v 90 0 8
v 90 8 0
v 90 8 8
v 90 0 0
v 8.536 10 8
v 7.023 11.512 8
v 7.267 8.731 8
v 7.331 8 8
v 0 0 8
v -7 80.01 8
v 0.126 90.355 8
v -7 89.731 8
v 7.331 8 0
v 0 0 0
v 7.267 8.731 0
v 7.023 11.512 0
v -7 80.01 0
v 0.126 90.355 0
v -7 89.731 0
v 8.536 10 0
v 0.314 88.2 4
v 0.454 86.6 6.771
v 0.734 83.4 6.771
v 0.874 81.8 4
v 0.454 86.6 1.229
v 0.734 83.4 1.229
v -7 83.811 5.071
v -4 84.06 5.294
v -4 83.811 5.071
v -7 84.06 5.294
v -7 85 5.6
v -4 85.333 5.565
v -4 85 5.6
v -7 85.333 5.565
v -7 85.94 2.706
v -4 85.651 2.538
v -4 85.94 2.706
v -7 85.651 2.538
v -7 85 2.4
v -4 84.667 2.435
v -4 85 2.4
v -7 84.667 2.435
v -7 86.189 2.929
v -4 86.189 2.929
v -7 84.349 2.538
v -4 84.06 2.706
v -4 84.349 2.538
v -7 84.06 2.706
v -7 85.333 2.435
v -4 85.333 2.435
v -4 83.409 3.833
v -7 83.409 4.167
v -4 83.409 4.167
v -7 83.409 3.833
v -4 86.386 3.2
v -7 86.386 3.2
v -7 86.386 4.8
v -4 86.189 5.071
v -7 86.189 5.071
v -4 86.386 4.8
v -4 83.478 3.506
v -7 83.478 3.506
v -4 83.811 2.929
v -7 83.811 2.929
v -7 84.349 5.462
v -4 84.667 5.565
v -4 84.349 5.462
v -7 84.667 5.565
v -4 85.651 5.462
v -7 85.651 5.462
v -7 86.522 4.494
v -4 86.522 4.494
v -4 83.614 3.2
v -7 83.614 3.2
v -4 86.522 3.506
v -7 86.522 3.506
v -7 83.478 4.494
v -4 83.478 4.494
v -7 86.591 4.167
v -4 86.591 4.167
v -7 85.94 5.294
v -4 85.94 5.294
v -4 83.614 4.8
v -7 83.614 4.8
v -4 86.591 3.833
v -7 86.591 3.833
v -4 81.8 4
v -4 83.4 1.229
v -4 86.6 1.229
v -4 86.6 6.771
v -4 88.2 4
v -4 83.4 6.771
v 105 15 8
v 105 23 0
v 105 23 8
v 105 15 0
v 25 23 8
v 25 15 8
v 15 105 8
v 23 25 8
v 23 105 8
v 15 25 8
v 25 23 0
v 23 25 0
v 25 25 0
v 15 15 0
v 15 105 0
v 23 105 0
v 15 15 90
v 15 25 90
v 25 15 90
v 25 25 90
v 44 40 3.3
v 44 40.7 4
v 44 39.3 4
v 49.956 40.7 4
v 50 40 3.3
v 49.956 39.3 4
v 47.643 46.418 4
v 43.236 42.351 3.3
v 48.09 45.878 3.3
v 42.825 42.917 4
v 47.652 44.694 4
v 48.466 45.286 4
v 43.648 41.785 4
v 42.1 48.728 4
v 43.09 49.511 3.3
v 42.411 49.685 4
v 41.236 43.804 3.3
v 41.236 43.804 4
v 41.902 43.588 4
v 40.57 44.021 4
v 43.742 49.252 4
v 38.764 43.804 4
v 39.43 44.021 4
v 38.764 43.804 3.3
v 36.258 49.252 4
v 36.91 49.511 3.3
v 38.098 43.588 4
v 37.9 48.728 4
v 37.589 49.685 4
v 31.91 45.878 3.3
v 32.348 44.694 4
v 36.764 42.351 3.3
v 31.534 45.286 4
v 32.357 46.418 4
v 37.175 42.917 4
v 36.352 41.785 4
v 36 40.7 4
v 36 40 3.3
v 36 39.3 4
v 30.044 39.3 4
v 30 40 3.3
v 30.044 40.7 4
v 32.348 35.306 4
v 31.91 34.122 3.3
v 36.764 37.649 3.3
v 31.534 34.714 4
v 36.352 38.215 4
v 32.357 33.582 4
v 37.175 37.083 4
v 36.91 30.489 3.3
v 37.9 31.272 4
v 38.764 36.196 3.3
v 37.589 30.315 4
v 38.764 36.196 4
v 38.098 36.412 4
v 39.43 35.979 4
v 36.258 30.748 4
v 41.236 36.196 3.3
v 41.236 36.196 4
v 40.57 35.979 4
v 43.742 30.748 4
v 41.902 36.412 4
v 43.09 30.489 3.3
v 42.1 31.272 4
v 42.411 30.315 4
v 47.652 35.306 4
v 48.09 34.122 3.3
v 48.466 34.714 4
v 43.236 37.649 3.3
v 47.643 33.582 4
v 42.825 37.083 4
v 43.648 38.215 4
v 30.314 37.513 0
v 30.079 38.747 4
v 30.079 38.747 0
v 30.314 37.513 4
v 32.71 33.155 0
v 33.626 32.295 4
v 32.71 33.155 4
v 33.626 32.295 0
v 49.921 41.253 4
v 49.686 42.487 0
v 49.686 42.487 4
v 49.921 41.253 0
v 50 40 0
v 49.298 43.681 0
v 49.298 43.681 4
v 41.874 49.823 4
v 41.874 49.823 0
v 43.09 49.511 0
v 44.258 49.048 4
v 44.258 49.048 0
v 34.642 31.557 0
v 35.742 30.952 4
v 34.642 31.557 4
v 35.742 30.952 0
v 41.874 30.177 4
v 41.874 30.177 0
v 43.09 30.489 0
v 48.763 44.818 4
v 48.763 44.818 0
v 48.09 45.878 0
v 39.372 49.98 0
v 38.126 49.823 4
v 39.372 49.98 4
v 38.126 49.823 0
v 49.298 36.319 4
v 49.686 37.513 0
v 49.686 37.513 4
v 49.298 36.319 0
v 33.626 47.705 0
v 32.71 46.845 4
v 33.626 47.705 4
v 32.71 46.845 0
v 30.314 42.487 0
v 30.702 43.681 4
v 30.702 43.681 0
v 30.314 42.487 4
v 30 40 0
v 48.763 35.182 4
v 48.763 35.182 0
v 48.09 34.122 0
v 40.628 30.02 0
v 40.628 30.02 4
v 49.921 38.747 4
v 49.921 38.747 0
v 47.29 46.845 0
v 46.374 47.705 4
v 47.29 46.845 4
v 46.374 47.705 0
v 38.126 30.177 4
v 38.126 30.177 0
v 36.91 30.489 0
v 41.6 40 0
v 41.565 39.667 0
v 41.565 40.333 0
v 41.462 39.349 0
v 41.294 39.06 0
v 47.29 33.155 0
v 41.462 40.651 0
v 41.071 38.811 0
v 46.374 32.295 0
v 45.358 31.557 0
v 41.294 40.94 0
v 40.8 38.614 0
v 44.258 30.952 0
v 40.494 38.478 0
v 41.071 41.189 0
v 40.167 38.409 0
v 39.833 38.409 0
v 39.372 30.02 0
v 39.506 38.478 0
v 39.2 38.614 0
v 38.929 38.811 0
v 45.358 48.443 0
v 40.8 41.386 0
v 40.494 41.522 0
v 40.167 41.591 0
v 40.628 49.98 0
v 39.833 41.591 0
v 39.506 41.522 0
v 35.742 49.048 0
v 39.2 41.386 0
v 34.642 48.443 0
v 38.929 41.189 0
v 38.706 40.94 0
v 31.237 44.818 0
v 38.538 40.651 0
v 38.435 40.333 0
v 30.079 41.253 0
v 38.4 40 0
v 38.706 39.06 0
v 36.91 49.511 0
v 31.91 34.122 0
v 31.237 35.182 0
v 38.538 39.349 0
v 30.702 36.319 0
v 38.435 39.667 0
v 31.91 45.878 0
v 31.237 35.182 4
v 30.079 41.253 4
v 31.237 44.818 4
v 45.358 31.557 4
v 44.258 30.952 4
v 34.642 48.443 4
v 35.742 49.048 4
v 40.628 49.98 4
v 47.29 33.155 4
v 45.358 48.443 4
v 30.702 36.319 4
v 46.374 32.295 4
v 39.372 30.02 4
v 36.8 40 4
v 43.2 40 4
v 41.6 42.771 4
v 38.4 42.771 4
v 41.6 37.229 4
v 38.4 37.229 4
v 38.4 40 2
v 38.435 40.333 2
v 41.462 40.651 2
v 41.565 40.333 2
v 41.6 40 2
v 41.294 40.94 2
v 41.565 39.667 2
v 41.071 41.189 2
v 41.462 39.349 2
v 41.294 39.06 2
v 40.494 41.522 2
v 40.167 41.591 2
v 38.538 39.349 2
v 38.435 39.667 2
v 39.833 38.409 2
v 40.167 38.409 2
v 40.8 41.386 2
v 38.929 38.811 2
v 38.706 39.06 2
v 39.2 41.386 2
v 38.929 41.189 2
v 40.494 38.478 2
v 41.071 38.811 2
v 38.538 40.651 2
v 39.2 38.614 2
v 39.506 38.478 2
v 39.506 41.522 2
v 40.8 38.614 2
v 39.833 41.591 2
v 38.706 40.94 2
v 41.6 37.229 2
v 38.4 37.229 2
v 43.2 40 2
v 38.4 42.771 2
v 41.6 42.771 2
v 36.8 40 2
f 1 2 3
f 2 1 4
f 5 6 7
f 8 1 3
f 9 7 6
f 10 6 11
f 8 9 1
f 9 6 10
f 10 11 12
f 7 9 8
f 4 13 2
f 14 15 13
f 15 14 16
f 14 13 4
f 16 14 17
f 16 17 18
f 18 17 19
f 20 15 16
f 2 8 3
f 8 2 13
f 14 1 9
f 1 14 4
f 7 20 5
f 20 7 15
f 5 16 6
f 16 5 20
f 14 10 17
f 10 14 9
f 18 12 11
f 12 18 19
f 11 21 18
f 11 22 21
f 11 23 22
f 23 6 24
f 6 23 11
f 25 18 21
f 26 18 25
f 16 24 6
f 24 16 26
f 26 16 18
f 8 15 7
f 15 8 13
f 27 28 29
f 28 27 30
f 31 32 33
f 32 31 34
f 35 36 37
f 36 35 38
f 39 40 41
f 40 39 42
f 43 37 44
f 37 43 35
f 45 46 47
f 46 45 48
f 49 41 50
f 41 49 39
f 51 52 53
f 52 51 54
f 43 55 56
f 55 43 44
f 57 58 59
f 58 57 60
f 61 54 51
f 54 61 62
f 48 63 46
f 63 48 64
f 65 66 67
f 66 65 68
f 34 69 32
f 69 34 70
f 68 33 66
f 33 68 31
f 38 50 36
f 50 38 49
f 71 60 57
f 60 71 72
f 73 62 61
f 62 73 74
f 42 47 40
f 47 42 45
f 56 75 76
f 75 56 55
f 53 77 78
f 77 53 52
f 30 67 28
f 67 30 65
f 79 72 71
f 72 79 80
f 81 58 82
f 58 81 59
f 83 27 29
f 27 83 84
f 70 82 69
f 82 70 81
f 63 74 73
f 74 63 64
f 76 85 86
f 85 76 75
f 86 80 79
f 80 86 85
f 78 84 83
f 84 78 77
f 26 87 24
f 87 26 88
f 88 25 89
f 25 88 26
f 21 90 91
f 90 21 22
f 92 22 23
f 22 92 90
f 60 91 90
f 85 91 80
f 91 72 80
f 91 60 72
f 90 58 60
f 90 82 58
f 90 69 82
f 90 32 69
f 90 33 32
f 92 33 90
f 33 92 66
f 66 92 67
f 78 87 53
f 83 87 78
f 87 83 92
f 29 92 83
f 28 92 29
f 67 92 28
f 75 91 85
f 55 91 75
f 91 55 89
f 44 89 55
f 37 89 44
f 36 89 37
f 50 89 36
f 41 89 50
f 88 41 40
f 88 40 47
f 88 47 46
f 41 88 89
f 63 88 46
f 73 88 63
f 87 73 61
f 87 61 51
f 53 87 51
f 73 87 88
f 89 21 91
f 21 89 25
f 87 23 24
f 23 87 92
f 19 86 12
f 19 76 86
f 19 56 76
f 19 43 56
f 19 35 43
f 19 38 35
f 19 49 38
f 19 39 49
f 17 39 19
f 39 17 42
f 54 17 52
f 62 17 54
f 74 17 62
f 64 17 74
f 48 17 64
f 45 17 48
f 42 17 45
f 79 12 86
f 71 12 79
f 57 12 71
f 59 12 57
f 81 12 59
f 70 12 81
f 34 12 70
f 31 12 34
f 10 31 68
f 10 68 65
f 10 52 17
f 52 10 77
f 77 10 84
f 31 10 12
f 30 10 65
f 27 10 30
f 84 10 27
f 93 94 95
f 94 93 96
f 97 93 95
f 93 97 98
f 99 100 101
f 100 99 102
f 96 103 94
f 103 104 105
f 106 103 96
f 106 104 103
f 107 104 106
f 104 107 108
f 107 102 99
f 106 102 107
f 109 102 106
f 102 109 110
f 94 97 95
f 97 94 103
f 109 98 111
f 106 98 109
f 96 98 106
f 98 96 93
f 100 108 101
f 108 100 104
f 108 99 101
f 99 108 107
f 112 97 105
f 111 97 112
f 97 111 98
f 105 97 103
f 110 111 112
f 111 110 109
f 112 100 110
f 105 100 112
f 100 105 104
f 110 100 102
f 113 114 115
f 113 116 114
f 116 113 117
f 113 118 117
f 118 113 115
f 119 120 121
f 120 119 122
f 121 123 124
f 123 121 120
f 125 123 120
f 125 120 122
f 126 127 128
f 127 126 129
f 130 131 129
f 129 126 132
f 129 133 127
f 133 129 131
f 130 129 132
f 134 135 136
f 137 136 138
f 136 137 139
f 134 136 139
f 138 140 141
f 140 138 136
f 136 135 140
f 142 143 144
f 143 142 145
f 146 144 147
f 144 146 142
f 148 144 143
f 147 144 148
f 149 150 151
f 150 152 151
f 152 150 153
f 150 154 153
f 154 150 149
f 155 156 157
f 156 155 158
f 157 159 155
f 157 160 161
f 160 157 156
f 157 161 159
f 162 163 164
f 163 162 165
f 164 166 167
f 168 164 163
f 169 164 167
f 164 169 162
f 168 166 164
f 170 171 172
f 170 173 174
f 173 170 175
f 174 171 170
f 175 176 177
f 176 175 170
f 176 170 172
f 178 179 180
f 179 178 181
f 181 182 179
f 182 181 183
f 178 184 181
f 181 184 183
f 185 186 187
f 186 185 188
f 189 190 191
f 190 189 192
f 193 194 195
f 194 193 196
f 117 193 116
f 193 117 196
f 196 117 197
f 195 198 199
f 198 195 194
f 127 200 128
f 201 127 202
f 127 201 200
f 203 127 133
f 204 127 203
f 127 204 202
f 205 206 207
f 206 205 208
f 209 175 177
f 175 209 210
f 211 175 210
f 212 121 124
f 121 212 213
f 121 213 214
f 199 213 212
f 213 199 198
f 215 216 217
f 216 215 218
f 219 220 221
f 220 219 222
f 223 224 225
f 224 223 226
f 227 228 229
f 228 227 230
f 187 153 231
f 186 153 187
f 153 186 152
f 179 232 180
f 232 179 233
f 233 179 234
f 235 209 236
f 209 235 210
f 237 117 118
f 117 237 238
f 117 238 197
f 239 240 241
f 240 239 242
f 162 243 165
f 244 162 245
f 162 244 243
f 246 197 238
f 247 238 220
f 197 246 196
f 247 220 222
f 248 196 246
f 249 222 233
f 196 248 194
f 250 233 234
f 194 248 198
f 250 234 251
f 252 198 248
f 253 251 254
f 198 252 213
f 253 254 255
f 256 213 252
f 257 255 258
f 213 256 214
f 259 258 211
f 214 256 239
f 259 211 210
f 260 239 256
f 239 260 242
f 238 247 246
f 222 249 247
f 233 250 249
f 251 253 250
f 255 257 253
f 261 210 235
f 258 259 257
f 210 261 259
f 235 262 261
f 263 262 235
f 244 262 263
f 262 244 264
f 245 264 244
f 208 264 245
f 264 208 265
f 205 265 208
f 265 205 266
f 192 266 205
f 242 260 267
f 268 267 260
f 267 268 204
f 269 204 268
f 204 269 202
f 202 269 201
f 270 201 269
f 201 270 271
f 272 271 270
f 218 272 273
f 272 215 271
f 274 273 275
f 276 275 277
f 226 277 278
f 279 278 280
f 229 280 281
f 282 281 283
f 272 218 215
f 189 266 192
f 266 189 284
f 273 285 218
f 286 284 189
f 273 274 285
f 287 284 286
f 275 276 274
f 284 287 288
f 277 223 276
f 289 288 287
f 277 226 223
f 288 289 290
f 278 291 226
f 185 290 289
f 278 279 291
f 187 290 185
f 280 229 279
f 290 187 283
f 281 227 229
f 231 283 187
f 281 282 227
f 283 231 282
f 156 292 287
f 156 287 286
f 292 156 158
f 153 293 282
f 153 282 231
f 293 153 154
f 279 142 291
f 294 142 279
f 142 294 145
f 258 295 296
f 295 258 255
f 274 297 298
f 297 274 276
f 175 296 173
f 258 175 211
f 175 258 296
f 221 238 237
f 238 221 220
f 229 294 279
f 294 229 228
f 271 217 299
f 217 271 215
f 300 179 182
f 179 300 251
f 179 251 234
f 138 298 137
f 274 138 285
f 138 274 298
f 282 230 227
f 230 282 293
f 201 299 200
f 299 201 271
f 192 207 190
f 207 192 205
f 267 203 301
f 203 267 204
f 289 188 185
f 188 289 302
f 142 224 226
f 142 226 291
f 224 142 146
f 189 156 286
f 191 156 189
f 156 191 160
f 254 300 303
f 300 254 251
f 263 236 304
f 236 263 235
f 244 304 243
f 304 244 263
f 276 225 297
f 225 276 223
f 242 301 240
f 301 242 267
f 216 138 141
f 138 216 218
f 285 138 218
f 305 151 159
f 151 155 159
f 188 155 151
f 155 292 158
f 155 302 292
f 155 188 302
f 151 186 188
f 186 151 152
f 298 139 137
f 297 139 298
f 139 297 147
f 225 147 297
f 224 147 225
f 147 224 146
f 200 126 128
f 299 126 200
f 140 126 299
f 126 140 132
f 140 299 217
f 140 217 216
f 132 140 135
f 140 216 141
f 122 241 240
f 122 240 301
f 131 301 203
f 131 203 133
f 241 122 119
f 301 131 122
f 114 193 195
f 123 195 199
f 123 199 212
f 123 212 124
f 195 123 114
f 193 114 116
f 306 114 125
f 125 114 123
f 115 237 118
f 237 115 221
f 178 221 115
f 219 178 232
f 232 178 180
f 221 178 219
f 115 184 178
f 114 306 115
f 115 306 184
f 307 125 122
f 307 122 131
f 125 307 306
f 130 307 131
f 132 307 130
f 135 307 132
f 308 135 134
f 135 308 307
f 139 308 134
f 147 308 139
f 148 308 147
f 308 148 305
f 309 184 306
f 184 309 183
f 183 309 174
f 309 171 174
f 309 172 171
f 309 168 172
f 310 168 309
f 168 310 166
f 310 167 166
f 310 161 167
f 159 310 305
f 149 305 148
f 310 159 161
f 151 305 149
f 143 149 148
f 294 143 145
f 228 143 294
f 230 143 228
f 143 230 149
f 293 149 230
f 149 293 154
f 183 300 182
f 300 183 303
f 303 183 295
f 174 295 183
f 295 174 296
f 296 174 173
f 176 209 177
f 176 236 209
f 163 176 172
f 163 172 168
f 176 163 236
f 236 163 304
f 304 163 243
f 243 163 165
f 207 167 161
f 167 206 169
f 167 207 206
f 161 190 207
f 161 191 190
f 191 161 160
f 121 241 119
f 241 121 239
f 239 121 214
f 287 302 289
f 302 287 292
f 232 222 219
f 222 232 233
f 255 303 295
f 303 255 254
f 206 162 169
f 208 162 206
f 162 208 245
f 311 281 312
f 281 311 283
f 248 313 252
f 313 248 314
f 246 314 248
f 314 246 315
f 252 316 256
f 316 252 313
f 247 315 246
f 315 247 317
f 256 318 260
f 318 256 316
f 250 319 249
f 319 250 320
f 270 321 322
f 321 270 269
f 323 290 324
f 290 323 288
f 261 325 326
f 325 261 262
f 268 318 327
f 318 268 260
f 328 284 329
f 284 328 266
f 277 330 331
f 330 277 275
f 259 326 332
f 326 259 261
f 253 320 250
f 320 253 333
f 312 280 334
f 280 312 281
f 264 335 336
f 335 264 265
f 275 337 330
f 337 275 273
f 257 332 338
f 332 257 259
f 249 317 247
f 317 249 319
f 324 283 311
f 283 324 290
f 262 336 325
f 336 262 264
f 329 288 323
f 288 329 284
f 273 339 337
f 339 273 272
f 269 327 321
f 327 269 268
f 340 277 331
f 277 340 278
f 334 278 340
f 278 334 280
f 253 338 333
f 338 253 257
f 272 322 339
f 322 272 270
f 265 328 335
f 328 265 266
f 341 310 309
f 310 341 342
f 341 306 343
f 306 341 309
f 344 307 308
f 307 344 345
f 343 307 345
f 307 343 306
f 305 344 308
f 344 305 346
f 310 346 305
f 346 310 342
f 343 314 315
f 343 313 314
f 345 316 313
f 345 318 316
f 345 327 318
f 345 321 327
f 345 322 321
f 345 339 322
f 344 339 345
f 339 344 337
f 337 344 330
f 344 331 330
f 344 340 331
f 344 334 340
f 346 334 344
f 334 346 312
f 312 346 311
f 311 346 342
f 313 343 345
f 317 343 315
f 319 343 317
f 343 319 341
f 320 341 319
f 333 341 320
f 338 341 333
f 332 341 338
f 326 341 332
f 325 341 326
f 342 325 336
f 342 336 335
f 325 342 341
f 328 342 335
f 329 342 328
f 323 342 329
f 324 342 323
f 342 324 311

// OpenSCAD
// OpenSCAD file for producing the testpiece, gauge and thumbwheel for orthogonal axis compensation for RepRapPro Ormerod, Mendel and Huxley printers //

long = 90; // Set length for testpiece here

// comment out the following lines to get the parts you want. Comment out the translations if you want the part at the origin.

Gauge();

translate ([15,15,0])
TestPiece();

translate ([40,40,0])
ThumbWheel();

module Gauge()
{
	difference()
	{
		 union()
		 {
			cube([long,8,8]);
			translate([5, 10, 4])
			rotate([0,0,45])
			cube([5,5,8], center=true);
			rotate([0,0,5])
			cube([8,long,8]);
		 }
		 translate([-5, long-5, 4])
		 {
			 rotate([0,90,0])
				cylinder(r=1.6,h=30,center=true,$fn=30);
			 translate([16,0,0])
			 rotate([0,90,0])
				rotate([0,0,30])
				cylinder(r=3.2,h=30,center=true,$fn=6);
			 translate([-10,-15,-10])
			 cube([8,25,20]);
		 }
	}
}

module ThumbWheel()
{
	translate ([0,0,2]) difference()
	{
		cylinder(r=10,h=4,center=true,$fn=50);
		cylinder(r=1.6,h=30,center=true,$fn=30);
	
		translate([0,0,15])
			cylinder(r=3.2,h=30,center=true,$fn=6);
		for(a = [0 : 9] )
		{
		rotate([0,0,36*a])
		translate([4,0,1.3])
			rotate([45,0,0])
				cube([20,4,4]);
		}
	}
}


module TestPiece()
{
 union()
 {
	cube([long,8,8]);
	cube([8,long,8]);
	cube([10,10,long]);
 }
}
